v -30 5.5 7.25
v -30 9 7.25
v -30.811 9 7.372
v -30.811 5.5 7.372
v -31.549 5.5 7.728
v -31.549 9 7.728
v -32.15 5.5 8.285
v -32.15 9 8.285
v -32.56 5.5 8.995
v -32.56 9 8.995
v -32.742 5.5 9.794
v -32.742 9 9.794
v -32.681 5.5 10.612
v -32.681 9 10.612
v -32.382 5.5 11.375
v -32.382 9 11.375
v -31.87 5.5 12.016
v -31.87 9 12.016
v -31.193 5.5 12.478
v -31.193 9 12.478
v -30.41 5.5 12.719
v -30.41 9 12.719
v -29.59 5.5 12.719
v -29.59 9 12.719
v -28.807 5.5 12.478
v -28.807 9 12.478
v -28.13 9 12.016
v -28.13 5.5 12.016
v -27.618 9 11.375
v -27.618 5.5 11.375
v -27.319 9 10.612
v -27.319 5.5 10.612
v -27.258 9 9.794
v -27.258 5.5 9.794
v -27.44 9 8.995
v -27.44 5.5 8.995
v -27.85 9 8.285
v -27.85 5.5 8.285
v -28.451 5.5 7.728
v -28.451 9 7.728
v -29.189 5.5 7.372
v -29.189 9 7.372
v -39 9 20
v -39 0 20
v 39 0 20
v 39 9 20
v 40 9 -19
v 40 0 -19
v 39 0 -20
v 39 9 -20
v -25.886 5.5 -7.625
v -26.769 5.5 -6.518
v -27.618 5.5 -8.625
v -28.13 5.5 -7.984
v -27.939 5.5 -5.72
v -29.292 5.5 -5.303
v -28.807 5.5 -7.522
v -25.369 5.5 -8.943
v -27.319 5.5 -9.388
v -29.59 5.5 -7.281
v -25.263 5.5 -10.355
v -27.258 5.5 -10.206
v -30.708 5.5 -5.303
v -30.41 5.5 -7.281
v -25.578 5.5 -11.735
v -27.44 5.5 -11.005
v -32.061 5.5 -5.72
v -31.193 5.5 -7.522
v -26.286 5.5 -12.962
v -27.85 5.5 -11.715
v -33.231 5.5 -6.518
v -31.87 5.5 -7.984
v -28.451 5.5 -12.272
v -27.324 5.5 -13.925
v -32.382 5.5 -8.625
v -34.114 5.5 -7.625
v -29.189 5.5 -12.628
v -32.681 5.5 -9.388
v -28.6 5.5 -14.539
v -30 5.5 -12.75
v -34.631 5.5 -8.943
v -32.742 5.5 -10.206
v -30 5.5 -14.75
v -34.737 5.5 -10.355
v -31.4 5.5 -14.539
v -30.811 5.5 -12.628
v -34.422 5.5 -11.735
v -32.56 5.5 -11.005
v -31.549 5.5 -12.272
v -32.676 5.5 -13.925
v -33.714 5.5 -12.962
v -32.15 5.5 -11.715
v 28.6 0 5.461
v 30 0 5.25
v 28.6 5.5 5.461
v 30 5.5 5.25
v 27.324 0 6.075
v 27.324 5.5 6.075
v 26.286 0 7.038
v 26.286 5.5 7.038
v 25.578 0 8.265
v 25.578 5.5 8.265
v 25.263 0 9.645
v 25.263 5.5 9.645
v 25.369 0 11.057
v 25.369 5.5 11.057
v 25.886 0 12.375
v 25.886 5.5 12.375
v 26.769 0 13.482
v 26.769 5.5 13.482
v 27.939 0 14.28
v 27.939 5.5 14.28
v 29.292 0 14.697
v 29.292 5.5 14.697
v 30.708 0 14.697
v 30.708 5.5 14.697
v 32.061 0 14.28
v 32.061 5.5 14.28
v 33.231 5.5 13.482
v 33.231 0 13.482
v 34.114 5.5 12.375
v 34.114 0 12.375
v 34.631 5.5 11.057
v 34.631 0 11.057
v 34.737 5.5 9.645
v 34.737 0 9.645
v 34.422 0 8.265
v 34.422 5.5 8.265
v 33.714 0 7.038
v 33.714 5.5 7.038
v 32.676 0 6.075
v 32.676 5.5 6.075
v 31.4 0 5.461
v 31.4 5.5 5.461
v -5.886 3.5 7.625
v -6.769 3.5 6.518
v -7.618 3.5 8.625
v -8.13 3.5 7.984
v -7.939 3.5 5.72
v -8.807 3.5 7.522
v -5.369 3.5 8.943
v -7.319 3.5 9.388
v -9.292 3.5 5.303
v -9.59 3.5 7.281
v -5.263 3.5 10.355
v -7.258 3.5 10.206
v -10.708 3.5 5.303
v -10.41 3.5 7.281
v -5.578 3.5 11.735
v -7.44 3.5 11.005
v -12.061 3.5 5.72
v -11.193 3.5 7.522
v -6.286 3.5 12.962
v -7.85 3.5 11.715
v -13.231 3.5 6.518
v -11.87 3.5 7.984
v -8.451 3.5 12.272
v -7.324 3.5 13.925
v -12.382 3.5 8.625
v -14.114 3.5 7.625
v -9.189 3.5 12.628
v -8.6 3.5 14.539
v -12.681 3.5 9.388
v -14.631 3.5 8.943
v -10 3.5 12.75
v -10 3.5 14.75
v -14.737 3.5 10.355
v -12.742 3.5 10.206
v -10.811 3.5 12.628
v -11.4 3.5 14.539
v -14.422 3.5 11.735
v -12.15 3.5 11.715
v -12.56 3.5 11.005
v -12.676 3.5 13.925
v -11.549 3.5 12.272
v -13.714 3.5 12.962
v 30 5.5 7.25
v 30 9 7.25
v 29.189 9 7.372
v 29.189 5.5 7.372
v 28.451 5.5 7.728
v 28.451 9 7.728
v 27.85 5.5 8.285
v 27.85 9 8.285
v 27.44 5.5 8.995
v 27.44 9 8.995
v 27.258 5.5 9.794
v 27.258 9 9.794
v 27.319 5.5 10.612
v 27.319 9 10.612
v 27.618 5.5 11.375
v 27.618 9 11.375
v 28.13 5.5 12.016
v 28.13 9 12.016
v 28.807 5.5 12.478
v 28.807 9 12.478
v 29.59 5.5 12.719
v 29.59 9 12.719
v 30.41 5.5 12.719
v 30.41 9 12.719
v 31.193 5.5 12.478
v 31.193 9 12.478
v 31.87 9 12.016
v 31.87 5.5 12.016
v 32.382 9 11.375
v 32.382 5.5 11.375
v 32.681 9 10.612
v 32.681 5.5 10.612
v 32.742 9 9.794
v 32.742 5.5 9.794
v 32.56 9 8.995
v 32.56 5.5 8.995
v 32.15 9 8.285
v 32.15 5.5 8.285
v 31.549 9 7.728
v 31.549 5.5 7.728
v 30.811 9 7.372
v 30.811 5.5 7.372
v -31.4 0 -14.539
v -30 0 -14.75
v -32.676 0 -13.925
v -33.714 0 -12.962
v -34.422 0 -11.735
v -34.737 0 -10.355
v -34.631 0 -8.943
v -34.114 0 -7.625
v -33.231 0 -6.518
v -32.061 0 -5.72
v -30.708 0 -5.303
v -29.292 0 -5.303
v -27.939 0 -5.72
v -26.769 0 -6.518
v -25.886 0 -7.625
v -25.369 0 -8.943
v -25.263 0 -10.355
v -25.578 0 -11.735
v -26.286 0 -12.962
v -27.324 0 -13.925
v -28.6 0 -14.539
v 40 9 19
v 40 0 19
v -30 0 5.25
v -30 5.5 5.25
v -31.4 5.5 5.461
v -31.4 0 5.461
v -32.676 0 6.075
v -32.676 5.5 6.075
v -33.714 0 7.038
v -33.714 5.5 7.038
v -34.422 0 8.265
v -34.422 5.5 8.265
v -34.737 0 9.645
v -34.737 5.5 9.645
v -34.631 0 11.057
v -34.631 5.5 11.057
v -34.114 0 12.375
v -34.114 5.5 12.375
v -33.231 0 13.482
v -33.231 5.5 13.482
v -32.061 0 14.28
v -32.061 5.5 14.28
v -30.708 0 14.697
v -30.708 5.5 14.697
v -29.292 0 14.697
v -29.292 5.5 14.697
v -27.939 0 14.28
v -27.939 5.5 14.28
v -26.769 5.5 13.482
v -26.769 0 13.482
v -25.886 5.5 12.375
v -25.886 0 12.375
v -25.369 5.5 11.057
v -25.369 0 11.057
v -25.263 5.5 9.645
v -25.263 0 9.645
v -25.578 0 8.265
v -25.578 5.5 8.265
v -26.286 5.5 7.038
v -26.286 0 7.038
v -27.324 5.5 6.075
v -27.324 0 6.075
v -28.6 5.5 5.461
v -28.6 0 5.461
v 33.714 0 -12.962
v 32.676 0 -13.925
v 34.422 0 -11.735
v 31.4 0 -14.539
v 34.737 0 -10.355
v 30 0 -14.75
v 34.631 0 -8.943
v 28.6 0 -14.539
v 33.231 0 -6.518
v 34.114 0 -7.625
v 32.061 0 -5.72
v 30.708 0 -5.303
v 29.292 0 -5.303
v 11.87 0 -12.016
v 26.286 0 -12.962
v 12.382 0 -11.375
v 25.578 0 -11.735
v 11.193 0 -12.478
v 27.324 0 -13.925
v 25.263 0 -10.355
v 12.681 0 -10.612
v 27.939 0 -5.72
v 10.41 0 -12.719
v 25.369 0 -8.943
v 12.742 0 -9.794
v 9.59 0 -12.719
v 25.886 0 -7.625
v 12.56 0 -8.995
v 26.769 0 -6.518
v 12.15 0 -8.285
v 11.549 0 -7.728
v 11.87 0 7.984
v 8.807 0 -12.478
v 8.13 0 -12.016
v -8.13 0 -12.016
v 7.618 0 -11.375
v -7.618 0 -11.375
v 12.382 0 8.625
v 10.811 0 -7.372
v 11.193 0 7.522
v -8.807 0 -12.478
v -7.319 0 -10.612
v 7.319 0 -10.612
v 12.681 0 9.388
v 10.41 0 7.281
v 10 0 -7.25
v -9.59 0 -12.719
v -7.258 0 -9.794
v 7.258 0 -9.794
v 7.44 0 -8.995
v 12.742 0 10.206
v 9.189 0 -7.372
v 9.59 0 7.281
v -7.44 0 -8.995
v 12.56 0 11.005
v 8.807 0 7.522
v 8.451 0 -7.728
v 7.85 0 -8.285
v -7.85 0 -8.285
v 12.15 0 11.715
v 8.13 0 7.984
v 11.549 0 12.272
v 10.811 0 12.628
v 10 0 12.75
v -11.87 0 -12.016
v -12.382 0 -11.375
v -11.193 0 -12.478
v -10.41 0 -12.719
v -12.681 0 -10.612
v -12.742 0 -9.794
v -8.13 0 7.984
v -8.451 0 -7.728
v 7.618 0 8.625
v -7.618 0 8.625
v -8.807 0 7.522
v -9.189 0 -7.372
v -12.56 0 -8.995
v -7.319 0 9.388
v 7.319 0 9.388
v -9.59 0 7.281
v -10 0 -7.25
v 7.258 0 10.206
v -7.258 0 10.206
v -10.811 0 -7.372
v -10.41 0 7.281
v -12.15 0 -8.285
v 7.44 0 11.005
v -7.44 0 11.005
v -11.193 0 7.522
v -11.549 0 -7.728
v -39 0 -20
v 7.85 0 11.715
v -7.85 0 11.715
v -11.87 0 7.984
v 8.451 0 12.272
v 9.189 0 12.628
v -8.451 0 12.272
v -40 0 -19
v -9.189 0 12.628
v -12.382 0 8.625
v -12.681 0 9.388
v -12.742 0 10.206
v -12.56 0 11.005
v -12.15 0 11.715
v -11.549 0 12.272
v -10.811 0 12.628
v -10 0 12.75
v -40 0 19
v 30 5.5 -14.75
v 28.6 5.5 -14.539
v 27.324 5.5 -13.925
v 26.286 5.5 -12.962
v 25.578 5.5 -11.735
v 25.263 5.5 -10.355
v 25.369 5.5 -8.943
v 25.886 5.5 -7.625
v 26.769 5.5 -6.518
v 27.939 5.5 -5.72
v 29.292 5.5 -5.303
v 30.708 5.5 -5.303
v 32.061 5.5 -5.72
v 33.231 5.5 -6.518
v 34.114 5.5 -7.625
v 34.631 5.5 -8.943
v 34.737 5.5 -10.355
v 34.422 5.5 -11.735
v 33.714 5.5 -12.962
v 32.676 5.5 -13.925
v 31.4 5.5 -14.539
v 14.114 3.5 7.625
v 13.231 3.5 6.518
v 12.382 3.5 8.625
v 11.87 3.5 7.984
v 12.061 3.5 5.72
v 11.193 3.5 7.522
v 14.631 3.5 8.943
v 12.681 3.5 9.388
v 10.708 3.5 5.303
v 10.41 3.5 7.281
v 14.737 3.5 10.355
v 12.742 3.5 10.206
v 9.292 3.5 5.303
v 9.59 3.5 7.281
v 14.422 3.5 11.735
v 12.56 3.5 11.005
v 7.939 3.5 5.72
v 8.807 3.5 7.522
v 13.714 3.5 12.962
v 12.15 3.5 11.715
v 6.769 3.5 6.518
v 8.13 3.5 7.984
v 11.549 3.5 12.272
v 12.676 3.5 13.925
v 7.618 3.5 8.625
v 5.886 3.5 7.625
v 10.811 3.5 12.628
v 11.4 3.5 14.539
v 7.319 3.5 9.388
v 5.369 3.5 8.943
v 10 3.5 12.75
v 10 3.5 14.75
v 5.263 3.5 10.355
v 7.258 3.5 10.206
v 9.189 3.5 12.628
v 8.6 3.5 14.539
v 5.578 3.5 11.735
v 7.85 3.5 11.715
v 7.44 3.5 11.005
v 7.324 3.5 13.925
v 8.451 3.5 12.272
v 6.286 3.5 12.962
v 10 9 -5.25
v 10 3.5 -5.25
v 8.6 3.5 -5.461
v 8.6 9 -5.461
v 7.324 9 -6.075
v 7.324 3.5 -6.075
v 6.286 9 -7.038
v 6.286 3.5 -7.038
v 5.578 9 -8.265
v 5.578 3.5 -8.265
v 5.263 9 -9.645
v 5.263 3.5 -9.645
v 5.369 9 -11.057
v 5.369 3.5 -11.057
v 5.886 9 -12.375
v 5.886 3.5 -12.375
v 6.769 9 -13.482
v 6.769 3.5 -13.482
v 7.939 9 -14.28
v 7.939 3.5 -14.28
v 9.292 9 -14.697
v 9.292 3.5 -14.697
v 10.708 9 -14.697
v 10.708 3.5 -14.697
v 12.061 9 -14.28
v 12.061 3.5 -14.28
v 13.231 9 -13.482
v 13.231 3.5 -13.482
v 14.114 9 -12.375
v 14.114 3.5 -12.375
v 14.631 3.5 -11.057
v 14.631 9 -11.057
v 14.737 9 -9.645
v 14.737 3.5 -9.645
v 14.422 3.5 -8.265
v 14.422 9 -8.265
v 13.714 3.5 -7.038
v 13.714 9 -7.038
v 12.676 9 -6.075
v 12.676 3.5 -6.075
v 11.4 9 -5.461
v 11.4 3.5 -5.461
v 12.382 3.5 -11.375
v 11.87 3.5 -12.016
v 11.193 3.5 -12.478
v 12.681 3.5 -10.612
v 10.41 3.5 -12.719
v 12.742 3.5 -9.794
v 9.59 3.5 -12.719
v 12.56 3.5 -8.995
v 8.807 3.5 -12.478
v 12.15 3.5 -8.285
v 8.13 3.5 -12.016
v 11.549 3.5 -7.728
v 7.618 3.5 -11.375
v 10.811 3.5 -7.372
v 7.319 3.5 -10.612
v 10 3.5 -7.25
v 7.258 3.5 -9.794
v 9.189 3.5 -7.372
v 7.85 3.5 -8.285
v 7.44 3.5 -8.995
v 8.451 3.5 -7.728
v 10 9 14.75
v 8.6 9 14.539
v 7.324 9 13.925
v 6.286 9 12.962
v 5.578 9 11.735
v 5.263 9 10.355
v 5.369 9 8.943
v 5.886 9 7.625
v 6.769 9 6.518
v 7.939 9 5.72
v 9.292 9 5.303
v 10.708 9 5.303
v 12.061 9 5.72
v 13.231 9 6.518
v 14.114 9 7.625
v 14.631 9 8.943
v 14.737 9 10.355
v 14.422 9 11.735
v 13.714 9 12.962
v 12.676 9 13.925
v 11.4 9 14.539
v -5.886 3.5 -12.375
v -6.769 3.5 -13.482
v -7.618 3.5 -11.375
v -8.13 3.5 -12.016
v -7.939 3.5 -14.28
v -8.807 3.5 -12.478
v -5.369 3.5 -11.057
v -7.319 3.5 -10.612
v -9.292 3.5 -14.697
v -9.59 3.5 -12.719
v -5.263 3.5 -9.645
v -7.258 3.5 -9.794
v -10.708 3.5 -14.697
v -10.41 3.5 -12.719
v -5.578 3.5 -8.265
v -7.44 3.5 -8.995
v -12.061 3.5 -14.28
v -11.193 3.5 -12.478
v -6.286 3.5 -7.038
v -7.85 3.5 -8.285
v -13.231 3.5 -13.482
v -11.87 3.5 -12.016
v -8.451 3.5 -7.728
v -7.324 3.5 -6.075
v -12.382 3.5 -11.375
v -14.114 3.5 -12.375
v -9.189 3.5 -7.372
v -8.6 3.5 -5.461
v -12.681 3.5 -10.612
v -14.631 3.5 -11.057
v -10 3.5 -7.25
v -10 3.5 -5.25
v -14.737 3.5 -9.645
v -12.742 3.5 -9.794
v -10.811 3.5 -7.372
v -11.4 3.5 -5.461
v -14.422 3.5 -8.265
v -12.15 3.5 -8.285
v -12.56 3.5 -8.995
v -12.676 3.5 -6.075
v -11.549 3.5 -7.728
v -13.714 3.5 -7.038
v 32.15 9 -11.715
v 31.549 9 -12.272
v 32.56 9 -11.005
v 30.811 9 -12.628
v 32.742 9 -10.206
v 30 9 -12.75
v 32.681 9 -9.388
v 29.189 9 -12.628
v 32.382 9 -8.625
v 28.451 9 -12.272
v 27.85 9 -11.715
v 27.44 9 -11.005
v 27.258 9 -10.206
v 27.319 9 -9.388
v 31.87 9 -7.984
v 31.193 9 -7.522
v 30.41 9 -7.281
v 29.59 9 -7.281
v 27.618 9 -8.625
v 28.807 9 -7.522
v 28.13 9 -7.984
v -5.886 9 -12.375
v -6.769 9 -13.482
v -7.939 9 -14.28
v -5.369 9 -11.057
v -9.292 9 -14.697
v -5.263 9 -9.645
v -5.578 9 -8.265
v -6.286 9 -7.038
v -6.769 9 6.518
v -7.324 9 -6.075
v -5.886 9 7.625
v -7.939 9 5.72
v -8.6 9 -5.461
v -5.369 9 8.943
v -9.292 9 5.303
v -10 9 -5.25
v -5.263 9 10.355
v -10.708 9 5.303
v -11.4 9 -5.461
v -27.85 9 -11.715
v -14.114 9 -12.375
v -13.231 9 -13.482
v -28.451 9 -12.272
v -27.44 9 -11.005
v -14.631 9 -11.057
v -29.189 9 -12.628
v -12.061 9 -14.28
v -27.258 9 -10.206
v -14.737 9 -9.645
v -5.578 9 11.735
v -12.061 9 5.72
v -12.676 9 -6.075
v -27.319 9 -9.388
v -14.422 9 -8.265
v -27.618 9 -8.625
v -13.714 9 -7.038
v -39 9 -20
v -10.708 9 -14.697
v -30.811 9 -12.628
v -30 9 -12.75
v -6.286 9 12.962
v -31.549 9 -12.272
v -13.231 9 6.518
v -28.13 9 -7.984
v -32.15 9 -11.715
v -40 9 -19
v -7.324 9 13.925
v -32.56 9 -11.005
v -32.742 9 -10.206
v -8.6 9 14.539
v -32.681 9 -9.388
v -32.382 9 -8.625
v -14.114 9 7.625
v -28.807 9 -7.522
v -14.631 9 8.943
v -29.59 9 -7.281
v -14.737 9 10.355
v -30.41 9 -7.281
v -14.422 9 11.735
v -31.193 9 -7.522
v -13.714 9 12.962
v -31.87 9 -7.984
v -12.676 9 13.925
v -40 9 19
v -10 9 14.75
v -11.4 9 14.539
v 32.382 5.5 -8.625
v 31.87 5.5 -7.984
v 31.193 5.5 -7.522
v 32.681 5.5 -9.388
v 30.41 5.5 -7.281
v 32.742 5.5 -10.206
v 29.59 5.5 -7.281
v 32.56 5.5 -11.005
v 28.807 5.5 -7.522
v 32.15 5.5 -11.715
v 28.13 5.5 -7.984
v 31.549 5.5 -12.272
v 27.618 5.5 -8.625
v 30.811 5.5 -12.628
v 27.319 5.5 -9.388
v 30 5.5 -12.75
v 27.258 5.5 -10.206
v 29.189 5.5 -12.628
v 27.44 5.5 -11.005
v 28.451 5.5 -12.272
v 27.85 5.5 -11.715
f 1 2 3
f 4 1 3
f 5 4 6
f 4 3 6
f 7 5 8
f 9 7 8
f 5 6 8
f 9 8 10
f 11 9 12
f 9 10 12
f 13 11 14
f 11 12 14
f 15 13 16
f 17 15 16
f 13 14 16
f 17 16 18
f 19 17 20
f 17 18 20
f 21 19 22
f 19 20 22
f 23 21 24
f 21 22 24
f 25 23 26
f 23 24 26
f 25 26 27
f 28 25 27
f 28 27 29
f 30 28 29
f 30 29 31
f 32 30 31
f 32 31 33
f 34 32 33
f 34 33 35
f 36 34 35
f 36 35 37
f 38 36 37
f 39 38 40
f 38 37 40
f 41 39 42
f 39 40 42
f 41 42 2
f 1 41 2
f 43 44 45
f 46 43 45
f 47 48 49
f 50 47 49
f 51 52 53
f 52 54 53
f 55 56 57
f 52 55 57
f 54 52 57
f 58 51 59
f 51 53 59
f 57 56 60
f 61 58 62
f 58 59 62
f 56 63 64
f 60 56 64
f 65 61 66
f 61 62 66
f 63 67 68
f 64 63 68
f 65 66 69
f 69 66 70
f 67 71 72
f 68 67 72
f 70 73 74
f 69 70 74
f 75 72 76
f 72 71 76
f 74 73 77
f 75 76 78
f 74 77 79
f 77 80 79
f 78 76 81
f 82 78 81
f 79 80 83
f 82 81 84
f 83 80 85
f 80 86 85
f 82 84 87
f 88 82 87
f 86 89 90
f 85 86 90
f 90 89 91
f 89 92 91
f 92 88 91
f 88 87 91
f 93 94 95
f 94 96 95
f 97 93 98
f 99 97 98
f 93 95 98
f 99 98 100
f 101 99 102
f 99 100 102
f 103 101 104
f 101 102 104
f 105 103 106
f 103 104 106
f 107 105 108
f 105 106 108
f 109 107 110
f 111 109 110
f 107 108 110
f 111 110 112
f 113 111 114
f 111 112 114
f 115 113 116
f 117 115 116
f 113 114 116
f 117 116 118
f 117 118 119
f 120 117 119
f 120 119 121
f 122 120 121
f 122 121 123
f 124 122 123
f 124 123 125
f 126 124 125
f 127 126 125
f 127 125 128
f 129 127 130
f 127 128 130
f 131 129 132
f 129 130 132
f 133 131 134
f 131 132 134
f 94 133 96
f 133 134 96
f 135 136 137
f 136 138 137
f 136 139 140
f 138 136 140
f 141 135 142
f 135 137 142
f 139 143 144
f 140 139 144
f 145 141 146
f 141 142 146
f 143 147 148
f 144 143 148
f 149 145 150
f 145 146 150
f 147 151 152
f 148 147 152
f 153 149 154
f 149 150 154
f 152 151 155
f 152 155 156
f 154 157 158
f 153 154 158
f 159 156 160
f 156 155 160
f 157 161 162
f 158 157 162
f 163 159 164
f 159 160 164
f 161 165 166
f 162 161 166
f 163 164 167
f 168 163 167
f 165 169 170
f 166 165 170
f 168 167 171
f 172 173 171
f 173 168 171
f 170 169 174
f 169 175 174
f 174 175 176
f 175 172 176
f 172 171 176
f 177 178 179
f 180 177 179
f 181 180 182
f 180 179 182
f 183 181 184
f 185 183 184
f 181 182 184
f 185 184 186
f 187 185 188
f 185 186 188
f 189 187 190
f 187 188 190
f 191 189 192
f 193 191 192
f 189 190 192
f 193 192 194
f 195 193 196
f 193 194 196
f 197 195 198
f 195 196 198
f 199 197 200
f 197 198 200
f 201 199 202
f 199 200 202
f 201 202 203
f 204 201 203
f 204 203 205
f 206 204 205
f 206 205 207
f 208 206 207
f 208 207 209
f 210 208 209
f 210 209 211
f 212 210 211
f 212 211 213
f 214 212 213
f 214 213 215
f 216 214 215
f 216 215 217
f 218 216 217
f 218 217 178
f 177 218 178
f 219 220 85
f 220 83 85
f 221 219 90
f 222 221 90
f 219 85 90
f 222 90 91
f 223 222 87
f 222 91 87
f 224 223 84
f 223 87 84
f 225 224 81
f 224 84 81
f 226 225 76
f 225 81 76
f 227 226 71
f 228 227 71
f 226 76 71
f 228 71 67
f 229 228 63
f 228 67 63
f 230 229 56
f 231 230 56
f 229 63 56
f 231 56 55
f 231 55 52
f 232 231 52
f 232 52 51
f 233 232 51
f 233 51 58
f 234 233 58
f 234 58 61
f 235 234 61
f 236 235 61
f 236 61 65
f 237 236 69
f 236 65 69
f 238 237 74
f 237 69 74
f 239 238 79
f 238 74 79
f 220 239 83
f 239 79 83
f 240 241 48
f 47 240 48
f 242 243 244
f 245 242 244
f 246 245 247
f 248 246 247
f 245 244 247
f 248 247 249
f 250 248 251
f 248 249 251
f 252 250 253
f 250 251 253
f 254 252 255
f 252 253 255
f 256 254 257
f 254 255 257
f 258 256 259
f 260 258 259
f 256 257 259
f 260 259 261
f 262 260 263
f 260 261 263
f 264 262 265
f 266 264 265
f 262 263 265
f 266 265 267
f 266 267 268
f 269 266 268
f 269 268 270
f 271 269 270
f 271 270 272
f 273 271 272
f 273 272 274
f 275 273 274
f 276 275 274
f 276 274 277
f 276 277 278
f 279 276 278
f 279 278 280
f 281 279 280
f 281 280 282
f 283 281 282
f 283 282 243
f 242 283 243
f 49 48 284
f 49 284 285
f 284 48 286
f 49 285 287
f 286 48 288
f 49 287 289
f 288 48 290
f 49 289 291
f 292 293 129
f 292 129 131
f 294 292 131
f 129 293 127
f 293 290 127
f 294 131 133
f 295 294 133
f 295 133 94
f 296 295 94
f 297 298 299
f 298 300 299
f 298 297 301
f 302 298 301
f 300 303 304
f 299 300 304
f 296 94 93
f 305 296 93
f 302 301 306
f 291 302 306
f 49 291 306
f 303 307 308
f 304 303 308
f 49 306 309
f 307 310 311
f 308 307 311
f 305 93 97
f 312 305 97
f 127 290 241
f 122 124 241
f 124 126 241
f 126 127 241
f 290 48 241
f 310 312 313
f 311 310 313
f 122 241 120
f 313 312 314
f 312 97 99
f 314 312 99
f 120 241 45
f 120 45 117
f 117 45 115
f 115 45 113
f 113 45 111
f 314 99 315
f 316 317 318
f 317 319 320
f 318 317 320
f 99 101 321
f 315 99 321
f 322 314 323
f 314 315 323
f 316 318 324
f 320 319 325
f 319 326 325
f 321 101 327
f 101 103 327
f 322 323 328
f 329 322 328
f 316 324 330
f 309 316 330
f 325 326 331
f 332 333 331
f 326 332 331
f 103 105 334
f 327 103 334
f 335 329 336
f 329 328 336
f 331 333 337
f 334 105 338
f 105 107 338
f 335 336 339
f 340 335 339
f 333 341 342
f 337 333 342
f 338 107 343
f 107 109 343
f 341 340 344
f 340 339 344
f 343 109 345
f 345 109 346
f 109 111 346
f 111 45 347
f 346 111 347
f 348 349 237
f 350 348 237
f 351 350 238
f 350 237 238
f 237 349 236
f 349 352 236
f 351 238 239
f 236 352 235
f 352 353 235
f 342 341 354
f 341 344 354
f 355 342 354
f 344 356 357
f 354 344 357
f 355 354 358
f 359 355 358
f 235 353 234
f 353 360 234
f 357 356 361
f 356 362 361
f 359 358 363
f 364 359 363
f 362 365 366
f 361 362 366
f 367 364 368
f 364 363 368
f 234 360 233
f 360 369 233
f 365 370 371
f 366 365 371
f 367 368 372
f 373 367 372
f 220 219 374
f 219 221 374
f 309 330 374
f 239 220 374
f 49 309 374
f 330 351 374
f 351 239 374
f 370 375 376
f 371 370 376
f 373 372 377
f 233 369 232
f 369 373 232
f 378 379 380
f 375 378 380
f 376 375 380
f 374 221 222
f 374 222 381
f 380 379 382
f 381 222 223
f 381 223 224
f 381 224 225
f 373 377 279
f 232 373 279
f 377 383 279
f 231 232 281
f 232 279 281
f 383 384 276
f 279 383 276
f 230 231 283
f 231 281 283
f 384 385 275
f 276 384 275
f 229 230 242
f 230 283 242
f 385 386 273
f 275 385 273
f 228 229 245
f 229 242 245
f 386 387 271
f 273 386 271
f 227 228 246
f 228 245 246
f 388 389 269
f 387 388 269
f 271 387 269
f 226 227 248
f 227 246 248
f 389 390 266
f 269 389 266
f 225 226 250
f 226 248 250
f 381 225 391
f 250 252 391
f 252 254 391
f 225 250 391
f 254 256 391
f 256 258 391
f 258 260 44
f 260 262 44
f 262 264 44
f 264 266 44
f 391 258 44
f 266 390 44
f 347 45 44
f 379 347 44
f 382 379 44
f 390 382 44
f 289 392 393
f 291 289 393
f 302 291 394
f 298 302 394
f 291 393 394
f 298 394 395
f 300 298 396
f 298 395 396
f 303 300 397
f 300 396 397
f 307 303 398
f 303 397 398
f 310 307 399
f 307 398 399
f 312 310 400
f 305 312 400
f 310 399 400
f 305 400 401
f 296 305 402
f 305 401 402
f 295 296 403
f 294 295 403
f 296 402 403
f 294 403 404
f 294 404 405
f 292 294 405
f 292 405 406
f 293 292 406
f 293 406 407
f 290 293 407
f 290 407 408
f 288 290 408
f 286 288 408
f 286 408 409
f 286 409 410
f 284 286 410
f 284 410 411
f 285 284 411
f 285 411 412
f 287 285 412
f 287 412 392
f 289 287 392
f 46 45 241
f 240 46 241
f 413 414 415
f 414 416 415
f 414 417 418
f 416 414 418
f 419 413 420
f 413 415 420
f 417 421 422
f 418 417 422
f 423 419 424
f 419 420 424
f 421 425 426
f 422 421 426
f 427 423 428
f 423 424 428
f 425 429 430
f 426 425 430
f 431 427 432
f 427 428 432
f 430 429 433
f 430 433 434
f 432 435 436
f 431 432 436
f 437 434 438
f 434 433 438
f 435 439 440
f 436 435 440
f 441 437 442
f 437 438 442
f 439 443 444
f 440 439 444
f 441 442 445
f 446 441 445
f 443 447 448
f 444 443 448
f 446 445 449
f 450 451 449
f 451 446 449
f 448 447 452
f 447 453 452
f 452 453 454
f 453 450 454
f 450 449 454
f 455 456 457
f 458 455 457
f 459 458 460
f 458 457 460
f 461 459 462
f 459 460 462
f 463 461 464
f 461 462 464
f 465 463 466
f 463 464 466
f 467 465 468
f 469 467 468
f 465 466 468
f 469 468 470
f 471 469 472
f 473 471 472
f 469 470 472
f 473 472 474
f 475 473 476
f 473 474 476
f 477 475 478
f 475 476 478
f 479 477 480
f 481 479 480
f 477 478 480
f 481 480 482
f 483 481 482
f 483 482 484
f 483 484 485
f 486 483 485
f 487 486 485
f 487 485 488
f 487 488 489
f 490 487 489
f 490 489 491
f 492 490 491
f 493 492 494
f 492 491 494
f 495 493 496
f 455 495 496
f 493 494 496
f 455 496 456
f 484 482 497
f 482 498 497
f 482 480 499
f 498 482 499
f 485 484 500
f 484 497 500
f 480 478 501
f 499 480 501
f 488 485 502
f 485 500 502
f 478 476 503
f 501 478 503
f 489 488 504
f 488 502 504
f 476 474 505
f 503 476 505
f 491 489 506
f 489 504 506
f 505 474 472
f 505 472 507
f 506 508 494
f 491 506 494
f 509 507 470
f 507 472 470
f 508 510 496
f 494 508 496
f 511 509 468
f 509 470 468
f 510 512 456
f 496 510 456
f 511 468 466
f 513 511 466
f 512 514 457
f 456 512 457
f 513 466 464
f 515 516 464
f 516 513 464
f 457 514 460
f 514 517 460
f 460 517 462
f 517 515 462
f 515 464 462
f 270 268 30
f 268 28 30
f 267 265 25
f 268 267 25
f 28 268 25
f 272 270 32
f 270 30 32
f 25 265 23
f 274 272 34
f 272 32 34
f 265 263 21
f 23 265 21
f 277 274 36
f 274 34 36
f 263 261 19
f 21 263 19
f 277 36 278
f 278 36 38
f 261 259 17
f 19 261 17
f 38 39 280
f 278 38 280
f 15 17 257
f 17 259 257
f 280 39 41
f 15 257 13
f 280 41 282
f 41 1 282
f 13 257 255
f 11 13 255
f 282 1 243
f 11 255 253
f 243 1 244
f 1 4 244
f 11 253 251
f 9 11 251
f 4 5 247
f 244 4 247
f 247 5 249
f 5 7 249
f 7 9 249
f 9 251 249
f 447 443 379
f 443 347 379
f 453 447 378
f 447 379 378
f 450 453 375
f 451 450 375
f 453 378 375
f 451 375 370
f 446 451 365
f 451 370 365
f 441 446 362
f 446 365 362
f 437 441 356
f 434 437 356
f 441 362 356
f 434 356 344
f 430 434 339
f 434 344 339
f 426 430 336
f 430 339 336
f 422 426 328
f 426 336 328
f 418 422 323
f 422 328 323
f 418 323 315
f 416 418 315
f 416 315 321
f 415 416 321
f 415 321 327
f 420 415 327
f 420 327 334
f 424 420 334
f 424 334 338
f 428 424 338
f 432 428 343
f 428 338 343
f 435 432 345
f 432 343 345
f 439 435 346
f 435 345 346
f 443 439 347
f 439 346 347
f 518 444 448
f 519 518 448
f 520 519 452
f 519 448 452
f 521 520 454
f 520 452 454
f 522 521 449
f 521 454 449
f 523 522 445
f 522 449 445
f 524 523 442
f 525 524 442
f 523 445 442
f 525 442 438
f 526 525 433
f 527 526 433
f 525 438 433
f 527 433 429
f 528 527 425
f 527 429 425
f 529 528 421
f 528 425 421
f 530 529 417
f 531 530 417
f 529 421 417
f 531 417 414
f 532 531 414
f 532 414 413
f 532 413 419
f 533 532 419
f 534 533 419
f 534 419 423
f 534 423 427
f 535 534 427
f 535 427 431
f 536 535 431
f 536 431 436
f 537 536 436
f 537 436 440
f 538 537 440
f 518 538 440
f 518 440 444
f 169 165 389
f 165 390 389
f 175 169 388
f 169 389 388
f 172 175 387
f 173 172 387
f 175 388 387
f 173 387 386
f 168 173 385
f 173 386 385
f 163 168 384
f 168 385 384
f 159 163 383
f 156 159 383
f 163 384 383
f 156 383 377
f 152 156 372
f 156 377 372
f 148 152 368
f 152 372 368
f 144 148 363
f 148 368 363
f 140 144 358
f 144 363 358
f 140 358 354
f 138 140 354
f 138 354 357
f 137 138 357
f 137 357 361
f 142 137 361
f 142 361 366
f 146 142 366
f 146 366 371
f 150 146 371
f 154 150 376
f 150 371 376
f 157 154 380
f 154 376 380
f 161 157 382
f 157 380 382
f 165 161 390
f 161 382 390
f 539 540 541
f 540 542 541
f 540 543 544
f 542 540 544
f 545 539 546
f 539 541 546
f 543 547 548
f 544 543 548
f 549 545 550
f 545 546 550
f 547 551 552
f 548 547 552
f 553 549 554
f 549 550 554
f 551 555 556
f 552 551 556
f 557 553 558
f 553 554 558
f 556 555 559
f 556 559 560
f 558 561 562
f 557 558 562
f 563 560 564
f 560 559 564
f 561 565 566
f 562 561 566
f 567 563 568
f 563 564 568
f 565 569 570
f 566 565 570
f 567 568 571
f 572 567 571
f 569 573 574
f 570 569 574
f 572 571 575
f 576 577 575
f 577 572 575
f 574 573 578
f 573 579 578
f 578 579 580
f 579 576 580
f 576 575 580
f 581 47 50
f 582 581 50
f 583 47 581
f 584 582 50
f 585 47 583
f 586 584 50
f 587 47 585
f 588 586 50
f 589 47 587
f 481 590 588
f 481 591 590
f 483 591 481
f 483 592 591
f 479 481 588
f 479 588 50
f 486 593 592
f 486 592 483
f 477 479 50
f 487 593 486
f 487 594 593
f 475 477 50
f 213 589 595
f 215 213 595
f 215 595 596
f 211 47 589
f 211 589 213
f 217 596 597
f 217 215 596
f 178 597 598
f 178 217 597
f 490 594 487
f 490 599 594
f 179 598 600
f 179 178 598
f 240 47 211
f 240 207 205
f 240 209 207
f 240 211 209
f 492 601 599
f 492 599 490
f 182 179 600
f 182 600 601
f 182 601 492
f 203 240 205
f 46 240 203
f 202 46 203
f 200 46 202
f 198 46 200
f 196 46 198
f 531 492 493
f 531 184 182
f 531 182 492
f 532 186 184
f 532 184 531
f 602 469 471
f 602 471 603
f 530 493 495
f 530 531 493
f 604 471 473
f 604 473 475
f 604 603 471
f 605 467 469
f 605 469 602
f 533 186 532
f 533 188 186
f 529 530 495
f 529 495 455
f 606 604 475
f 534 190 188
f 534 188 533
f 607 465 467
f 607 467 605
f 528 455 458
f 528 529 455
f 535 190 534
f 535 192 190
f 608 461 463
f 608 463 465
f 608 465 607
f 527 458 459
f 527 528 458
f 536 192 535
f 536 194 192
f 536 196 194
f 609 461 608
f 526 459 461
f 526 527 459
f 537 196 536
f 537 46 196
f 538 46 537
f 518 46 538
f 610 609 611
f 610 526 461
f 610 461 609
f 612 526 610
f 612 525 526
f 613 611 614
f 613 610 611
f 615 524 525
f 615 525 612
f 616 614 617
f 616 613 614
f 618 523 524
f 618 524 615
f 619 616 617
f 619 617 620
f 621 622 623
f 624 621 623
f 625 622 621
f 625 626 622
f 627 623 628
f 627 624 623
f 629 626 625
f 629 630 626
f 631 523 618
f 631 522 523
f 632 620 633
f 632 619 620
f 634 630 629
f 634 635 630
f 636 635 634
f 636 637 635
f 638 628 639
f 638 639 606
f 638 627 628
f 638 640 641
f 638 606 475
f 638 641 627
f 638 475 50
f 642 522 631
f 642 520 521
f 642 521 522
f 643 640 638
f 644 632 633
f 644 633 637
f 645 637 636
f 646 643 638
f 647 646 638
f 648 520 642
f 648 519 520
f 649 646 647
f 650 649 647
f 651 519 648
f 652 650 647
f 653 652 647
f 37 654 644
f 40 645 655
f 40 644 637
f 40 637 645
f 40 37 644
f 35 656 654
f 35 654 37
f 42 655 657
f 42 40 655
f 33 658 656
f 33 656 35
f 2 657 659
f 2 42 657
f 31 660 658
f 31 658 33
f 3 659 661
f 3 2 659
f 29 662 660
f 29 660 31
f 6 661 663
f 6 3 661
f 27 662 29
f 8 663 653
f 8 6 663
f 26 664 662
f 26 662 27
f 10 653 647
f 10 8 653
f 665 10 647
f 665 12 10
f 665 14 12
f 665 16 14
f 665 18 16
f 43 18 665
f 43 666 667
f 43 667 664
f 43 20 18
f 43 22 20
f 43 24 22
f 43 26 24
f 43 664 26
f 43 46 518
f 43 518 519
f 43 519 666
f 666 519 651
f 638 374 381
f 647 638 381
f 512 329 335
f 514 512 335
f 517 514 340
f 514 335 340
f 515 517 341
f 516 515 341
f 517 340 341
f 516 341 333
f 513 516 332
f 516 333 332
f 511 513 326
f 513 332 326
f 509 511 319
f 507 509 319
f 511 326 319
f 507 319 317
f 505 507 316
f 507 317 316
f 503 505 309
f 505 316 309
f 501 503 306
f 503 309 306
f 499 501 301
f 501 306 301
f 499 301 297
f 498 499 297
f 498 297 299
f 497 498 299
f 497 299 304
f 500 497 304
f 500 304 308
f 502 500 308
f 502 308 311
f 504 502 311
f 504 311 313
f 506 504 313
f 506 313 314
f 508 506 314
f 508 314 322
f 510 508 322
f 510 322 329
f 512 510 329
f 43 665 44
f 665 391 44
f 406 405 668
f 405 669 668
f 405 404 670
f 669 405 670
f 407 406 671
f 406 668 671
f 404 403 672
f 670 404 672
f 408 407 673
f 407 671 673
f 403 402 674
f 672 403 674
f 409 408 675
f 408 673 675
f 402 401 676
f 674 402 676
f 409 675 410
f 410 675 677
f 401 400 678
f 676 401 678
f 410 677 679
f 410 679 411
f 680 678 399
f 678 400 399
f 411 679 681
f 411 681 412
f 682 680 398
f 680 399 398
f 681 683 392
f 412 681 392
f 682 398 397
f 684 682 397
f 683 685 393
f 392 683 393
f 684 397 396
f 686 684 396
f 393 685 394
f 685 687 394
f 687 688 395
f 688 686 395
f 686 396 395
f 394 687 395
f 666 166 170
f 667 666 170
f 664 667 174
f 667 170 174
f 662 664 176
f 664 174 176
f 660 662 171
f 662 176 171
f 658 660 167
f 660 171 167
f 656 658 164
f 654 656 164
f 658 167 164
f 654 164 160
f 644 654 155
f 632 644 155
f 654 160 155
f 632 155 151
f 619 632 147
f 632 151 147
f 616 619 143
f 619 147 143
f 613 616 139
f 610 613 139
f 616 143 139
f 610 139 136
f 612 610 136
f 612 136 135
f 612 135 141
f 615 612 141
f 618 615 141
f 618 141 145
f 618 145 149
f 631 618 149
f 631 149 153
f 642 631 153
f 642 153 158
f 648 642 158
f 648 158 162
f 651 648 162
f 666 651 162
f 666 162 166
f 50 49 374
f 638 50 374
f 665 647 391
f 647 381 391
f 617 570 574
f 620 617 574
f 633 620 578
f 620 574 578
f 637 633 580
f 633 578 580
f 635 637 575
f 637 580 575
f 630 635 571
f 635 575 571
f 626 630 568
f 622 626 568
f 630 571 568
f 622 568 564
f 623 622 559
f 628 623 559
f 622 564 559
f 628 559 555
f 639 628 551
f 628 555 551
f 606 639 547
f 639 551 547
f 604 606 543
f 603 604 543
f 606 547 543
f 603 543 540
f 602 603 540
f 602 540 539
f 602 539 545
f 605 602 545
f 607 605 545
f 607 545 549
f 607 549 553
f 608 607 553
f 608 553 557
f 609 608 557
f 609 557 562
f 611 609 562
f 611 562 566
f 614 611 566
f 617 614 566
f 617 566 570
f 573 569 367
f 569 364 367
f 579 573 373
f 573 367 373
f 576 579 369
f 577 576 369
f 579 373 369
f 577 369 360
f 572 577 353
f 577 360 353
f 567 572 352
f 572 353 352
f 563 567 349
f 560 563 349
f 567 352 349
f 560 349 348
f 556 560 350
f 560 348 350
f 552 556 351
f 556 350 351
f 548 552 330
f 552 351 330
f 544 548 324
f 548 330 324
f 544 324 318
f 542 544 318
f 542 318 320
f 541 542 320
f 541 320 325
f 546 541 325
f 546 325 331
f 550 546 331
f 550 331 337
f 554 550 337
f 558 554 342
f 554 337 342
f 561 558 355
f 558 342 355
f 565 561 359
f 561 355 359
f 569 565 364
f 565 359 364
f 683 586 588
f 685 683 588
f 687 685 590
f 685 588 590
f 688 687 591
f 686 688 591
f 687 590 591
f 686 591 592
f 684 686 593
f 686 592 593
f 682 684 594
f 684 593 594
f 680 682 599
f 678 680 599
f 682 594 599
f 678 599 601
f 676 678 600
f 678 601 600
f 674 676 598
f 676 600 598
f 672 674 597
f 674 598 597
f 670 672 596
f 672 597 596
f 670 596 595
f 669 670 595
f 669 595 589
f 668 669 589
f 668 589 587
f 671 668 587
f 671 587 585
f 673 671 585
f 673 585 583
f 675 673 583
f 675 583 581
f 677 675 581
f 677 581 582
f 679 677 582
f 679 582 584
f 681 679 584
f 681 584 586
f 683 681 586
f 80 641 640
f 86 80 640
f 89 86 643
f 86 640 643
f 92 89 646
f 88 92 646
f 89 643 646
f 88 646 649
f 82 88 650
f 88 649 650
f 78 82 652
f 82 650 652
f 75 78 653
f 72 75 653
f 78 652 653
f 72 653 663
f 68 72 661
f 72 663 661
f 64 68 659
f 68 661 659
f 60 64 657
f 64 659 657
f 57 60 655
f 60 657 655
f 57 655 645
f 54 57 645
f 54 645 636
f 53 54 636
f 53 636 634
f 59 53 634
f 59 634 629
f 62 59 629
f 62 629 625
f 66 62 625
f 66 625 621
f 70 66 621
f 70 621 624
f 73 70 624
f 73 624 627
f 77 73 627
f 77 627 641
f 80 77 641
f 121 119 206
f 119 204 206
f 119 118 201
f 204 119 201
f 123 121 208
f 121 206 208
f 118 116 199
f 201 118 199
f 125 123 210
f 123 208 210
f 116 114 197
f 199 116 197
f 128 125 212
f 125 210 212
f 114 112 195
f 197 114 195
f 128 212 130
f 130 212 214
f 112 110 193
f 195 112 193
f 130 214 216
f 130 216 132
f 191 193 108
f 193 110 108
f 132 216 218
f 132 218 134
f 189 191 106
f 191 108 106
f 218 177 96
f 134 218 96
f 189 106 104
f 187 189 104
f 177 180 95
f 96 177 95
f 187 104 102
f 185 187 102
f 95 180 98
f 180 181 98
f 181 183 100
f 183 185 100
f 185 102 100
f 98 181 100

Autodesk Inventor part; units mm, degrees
sketch "Sketch_4" plane through (0, 0, 0) normal (0, 1, 0) x (-1, 0, 0)
  line L0 (40, -19) -> (40, 19)
  line L1 (40, 19) -> (39, 20)
  line L2 (39, 20) -> (-39, 20)
  line L3 (-39, 20) -> (-40, 19)
  line L4 (-40, 19) -> (-40, -19)
  line L5 (-40, -19) -> (-39, -20)
  line L6 (-39, -20) -> (39, -20)
  line L7 (39, -20) -> (40, -19)
extrude "Extrusion1" add sketch "Sketch_4" along normal blind 9
sketch "Sketch2" plane through (0, 0, 0) normal (0, -1, 0) x (1, 0, 0)
  point P0 (-30, 10)
hole "Hole1" at (-30, 0, 10) direction (0, 1, 0) diameter 5.5 depth 9 counterbore diameter 9.5 counterbore depth 5.5
pattern_linear "Rectangular Pattern1" count 2 spacing 60 along (1, 0, 0) count 2 spacing 20 along (0, 0, -1) of "Hole1"
sketch "Sketch3" plane through (0, 9, 0) normal (0, 1, 0) x (1, 0, 0)
  point P0 (-10, -10)
hole "Hole2" at (-10, 9, 10) direction (0, -1, 0) diameter 5.5 depth 9 counterbore diameter 9.5 counterbore depth 5.5
pattern_linear "Rectangular Pattern2" count 2 spacing 20 along (1, 0, 0) count 2 spacing 20 along (0, 0, -1) of "Hole2"
ref_plane "bolt4_1_XY" through (-10, 3.5, 10) normal (0, 1, 0) x (1, 0, 0)
ref_plane "bolt4_1_YZ" through (-10, 3.5, 10) normal (1, 0, 0) x (0, 0, -1)
ref_plane "bolt4_1_ZX" through (-10, 3.5, 10) normal (0, 0, -1) x (0, 1, 0)
ref_plane "bolt4_2_XY" through (10, 3.5, 10) normal (0, 1, 0) x (1, 0, 0)
ref_plane "bolt4_2_YZ" through (10, 3.5, 10) normal (1, 0, 0) x (0, 0, -1)
ref_plane "bolt4_2_ZX" through (10, 3.5, 10) normal (0, 0, -1) x (0, 1, 0)
ref_plane "bolt4_3_XY" through (-10, 3.5, -10) normal (0, 1, 0) x (1, 0, 0)
ref_plane "bolt4_3_YZ" through (-10, 3.5, -10) normal (1, 0, 0) x (0, 0, -1)
ref_plane "bolt4_3_ZX" through (-10, 3.5, -10) normal (0, 0, -1) x (0, 1, 0)
ref_plane "bolt4_4_XY" through (10, 3.5, -10) normal (0, 1, 0) x (1, 0, 0)
ref_plane "bolt4_4_YZ" through (10, 3.5, -10) normal (1, 0, 0) x (0, 0, -1)
ref_plane "bolt4_4_ZX" through (10, 3.5, -10) normal (0, 0, -1) x (0, 1, 0)
ref_plane "bolt5_1_XY" through (-30, 5.5, 10) normal (0, 1, 0) x (1, 0, 0)
ref_plane "bolt5_1_YZ" through (-30, 5.5, 10) normal (1, 0, 0) x (0, 0, -1)
ref_plane "bolt5_1_ZX" through (-30, 5.5, 10) normal (0, 0, -1) x (0, 1, 0)
ref_plane "bolt5_2_XY" through (30, 5.5, 10) normal (0, 1, 0) x (1, 0, 0)
ref_plane "bolt5_2_YZ" through (30, 5.5, 10) normal (1, 0, 0) x (0, 0, -1)
ref_plane "bolt5_2_ZX" through (30, 5.5, 10) normal (0, 0, -1) x (0, 1, 0)
ref_plane "bolt5_3_XY" through (-30, 5.5, -10) normal (0, 1, 0) x (1, 0, 0)
ref_plane "bolt5_3_YZ" through (-30, 5.5, -10) normal (1, 0, 0) x (0, 0, -1)
ref_plane "bolt5_3_ZX" through (-30, 5.5, -10) normal (0, 0, -1) x (0, 1, 0)
ref_plane "bolt5_4_XY" through (30, 5.5, -10) normal (0, 1, 0) x (1, 0, 0)
ref_plane "bolt5_4_YZ" through (30, 5.5, -10) normal (1, 0, 0) x (0, 0, -1)
ref_plane "bolt5_4_ZX" through (30, 5.5, -10) normal (0, 0, -1) x (0, 1, 0)
ref_plane "bracket_XY" through (0, 9, 0) normal (0, 1, 0) x (1, 0, 0)
ref_plane "bracket_YZ" through (0, 9, 0) normal (1, 0, 0) x (0, 0, -1)
ref_plane "bracket_ZX" through (0, 9, 0) normal (0, 0, -1) x (0, 1, 0)
properties part number "HBLPL5-4040"
